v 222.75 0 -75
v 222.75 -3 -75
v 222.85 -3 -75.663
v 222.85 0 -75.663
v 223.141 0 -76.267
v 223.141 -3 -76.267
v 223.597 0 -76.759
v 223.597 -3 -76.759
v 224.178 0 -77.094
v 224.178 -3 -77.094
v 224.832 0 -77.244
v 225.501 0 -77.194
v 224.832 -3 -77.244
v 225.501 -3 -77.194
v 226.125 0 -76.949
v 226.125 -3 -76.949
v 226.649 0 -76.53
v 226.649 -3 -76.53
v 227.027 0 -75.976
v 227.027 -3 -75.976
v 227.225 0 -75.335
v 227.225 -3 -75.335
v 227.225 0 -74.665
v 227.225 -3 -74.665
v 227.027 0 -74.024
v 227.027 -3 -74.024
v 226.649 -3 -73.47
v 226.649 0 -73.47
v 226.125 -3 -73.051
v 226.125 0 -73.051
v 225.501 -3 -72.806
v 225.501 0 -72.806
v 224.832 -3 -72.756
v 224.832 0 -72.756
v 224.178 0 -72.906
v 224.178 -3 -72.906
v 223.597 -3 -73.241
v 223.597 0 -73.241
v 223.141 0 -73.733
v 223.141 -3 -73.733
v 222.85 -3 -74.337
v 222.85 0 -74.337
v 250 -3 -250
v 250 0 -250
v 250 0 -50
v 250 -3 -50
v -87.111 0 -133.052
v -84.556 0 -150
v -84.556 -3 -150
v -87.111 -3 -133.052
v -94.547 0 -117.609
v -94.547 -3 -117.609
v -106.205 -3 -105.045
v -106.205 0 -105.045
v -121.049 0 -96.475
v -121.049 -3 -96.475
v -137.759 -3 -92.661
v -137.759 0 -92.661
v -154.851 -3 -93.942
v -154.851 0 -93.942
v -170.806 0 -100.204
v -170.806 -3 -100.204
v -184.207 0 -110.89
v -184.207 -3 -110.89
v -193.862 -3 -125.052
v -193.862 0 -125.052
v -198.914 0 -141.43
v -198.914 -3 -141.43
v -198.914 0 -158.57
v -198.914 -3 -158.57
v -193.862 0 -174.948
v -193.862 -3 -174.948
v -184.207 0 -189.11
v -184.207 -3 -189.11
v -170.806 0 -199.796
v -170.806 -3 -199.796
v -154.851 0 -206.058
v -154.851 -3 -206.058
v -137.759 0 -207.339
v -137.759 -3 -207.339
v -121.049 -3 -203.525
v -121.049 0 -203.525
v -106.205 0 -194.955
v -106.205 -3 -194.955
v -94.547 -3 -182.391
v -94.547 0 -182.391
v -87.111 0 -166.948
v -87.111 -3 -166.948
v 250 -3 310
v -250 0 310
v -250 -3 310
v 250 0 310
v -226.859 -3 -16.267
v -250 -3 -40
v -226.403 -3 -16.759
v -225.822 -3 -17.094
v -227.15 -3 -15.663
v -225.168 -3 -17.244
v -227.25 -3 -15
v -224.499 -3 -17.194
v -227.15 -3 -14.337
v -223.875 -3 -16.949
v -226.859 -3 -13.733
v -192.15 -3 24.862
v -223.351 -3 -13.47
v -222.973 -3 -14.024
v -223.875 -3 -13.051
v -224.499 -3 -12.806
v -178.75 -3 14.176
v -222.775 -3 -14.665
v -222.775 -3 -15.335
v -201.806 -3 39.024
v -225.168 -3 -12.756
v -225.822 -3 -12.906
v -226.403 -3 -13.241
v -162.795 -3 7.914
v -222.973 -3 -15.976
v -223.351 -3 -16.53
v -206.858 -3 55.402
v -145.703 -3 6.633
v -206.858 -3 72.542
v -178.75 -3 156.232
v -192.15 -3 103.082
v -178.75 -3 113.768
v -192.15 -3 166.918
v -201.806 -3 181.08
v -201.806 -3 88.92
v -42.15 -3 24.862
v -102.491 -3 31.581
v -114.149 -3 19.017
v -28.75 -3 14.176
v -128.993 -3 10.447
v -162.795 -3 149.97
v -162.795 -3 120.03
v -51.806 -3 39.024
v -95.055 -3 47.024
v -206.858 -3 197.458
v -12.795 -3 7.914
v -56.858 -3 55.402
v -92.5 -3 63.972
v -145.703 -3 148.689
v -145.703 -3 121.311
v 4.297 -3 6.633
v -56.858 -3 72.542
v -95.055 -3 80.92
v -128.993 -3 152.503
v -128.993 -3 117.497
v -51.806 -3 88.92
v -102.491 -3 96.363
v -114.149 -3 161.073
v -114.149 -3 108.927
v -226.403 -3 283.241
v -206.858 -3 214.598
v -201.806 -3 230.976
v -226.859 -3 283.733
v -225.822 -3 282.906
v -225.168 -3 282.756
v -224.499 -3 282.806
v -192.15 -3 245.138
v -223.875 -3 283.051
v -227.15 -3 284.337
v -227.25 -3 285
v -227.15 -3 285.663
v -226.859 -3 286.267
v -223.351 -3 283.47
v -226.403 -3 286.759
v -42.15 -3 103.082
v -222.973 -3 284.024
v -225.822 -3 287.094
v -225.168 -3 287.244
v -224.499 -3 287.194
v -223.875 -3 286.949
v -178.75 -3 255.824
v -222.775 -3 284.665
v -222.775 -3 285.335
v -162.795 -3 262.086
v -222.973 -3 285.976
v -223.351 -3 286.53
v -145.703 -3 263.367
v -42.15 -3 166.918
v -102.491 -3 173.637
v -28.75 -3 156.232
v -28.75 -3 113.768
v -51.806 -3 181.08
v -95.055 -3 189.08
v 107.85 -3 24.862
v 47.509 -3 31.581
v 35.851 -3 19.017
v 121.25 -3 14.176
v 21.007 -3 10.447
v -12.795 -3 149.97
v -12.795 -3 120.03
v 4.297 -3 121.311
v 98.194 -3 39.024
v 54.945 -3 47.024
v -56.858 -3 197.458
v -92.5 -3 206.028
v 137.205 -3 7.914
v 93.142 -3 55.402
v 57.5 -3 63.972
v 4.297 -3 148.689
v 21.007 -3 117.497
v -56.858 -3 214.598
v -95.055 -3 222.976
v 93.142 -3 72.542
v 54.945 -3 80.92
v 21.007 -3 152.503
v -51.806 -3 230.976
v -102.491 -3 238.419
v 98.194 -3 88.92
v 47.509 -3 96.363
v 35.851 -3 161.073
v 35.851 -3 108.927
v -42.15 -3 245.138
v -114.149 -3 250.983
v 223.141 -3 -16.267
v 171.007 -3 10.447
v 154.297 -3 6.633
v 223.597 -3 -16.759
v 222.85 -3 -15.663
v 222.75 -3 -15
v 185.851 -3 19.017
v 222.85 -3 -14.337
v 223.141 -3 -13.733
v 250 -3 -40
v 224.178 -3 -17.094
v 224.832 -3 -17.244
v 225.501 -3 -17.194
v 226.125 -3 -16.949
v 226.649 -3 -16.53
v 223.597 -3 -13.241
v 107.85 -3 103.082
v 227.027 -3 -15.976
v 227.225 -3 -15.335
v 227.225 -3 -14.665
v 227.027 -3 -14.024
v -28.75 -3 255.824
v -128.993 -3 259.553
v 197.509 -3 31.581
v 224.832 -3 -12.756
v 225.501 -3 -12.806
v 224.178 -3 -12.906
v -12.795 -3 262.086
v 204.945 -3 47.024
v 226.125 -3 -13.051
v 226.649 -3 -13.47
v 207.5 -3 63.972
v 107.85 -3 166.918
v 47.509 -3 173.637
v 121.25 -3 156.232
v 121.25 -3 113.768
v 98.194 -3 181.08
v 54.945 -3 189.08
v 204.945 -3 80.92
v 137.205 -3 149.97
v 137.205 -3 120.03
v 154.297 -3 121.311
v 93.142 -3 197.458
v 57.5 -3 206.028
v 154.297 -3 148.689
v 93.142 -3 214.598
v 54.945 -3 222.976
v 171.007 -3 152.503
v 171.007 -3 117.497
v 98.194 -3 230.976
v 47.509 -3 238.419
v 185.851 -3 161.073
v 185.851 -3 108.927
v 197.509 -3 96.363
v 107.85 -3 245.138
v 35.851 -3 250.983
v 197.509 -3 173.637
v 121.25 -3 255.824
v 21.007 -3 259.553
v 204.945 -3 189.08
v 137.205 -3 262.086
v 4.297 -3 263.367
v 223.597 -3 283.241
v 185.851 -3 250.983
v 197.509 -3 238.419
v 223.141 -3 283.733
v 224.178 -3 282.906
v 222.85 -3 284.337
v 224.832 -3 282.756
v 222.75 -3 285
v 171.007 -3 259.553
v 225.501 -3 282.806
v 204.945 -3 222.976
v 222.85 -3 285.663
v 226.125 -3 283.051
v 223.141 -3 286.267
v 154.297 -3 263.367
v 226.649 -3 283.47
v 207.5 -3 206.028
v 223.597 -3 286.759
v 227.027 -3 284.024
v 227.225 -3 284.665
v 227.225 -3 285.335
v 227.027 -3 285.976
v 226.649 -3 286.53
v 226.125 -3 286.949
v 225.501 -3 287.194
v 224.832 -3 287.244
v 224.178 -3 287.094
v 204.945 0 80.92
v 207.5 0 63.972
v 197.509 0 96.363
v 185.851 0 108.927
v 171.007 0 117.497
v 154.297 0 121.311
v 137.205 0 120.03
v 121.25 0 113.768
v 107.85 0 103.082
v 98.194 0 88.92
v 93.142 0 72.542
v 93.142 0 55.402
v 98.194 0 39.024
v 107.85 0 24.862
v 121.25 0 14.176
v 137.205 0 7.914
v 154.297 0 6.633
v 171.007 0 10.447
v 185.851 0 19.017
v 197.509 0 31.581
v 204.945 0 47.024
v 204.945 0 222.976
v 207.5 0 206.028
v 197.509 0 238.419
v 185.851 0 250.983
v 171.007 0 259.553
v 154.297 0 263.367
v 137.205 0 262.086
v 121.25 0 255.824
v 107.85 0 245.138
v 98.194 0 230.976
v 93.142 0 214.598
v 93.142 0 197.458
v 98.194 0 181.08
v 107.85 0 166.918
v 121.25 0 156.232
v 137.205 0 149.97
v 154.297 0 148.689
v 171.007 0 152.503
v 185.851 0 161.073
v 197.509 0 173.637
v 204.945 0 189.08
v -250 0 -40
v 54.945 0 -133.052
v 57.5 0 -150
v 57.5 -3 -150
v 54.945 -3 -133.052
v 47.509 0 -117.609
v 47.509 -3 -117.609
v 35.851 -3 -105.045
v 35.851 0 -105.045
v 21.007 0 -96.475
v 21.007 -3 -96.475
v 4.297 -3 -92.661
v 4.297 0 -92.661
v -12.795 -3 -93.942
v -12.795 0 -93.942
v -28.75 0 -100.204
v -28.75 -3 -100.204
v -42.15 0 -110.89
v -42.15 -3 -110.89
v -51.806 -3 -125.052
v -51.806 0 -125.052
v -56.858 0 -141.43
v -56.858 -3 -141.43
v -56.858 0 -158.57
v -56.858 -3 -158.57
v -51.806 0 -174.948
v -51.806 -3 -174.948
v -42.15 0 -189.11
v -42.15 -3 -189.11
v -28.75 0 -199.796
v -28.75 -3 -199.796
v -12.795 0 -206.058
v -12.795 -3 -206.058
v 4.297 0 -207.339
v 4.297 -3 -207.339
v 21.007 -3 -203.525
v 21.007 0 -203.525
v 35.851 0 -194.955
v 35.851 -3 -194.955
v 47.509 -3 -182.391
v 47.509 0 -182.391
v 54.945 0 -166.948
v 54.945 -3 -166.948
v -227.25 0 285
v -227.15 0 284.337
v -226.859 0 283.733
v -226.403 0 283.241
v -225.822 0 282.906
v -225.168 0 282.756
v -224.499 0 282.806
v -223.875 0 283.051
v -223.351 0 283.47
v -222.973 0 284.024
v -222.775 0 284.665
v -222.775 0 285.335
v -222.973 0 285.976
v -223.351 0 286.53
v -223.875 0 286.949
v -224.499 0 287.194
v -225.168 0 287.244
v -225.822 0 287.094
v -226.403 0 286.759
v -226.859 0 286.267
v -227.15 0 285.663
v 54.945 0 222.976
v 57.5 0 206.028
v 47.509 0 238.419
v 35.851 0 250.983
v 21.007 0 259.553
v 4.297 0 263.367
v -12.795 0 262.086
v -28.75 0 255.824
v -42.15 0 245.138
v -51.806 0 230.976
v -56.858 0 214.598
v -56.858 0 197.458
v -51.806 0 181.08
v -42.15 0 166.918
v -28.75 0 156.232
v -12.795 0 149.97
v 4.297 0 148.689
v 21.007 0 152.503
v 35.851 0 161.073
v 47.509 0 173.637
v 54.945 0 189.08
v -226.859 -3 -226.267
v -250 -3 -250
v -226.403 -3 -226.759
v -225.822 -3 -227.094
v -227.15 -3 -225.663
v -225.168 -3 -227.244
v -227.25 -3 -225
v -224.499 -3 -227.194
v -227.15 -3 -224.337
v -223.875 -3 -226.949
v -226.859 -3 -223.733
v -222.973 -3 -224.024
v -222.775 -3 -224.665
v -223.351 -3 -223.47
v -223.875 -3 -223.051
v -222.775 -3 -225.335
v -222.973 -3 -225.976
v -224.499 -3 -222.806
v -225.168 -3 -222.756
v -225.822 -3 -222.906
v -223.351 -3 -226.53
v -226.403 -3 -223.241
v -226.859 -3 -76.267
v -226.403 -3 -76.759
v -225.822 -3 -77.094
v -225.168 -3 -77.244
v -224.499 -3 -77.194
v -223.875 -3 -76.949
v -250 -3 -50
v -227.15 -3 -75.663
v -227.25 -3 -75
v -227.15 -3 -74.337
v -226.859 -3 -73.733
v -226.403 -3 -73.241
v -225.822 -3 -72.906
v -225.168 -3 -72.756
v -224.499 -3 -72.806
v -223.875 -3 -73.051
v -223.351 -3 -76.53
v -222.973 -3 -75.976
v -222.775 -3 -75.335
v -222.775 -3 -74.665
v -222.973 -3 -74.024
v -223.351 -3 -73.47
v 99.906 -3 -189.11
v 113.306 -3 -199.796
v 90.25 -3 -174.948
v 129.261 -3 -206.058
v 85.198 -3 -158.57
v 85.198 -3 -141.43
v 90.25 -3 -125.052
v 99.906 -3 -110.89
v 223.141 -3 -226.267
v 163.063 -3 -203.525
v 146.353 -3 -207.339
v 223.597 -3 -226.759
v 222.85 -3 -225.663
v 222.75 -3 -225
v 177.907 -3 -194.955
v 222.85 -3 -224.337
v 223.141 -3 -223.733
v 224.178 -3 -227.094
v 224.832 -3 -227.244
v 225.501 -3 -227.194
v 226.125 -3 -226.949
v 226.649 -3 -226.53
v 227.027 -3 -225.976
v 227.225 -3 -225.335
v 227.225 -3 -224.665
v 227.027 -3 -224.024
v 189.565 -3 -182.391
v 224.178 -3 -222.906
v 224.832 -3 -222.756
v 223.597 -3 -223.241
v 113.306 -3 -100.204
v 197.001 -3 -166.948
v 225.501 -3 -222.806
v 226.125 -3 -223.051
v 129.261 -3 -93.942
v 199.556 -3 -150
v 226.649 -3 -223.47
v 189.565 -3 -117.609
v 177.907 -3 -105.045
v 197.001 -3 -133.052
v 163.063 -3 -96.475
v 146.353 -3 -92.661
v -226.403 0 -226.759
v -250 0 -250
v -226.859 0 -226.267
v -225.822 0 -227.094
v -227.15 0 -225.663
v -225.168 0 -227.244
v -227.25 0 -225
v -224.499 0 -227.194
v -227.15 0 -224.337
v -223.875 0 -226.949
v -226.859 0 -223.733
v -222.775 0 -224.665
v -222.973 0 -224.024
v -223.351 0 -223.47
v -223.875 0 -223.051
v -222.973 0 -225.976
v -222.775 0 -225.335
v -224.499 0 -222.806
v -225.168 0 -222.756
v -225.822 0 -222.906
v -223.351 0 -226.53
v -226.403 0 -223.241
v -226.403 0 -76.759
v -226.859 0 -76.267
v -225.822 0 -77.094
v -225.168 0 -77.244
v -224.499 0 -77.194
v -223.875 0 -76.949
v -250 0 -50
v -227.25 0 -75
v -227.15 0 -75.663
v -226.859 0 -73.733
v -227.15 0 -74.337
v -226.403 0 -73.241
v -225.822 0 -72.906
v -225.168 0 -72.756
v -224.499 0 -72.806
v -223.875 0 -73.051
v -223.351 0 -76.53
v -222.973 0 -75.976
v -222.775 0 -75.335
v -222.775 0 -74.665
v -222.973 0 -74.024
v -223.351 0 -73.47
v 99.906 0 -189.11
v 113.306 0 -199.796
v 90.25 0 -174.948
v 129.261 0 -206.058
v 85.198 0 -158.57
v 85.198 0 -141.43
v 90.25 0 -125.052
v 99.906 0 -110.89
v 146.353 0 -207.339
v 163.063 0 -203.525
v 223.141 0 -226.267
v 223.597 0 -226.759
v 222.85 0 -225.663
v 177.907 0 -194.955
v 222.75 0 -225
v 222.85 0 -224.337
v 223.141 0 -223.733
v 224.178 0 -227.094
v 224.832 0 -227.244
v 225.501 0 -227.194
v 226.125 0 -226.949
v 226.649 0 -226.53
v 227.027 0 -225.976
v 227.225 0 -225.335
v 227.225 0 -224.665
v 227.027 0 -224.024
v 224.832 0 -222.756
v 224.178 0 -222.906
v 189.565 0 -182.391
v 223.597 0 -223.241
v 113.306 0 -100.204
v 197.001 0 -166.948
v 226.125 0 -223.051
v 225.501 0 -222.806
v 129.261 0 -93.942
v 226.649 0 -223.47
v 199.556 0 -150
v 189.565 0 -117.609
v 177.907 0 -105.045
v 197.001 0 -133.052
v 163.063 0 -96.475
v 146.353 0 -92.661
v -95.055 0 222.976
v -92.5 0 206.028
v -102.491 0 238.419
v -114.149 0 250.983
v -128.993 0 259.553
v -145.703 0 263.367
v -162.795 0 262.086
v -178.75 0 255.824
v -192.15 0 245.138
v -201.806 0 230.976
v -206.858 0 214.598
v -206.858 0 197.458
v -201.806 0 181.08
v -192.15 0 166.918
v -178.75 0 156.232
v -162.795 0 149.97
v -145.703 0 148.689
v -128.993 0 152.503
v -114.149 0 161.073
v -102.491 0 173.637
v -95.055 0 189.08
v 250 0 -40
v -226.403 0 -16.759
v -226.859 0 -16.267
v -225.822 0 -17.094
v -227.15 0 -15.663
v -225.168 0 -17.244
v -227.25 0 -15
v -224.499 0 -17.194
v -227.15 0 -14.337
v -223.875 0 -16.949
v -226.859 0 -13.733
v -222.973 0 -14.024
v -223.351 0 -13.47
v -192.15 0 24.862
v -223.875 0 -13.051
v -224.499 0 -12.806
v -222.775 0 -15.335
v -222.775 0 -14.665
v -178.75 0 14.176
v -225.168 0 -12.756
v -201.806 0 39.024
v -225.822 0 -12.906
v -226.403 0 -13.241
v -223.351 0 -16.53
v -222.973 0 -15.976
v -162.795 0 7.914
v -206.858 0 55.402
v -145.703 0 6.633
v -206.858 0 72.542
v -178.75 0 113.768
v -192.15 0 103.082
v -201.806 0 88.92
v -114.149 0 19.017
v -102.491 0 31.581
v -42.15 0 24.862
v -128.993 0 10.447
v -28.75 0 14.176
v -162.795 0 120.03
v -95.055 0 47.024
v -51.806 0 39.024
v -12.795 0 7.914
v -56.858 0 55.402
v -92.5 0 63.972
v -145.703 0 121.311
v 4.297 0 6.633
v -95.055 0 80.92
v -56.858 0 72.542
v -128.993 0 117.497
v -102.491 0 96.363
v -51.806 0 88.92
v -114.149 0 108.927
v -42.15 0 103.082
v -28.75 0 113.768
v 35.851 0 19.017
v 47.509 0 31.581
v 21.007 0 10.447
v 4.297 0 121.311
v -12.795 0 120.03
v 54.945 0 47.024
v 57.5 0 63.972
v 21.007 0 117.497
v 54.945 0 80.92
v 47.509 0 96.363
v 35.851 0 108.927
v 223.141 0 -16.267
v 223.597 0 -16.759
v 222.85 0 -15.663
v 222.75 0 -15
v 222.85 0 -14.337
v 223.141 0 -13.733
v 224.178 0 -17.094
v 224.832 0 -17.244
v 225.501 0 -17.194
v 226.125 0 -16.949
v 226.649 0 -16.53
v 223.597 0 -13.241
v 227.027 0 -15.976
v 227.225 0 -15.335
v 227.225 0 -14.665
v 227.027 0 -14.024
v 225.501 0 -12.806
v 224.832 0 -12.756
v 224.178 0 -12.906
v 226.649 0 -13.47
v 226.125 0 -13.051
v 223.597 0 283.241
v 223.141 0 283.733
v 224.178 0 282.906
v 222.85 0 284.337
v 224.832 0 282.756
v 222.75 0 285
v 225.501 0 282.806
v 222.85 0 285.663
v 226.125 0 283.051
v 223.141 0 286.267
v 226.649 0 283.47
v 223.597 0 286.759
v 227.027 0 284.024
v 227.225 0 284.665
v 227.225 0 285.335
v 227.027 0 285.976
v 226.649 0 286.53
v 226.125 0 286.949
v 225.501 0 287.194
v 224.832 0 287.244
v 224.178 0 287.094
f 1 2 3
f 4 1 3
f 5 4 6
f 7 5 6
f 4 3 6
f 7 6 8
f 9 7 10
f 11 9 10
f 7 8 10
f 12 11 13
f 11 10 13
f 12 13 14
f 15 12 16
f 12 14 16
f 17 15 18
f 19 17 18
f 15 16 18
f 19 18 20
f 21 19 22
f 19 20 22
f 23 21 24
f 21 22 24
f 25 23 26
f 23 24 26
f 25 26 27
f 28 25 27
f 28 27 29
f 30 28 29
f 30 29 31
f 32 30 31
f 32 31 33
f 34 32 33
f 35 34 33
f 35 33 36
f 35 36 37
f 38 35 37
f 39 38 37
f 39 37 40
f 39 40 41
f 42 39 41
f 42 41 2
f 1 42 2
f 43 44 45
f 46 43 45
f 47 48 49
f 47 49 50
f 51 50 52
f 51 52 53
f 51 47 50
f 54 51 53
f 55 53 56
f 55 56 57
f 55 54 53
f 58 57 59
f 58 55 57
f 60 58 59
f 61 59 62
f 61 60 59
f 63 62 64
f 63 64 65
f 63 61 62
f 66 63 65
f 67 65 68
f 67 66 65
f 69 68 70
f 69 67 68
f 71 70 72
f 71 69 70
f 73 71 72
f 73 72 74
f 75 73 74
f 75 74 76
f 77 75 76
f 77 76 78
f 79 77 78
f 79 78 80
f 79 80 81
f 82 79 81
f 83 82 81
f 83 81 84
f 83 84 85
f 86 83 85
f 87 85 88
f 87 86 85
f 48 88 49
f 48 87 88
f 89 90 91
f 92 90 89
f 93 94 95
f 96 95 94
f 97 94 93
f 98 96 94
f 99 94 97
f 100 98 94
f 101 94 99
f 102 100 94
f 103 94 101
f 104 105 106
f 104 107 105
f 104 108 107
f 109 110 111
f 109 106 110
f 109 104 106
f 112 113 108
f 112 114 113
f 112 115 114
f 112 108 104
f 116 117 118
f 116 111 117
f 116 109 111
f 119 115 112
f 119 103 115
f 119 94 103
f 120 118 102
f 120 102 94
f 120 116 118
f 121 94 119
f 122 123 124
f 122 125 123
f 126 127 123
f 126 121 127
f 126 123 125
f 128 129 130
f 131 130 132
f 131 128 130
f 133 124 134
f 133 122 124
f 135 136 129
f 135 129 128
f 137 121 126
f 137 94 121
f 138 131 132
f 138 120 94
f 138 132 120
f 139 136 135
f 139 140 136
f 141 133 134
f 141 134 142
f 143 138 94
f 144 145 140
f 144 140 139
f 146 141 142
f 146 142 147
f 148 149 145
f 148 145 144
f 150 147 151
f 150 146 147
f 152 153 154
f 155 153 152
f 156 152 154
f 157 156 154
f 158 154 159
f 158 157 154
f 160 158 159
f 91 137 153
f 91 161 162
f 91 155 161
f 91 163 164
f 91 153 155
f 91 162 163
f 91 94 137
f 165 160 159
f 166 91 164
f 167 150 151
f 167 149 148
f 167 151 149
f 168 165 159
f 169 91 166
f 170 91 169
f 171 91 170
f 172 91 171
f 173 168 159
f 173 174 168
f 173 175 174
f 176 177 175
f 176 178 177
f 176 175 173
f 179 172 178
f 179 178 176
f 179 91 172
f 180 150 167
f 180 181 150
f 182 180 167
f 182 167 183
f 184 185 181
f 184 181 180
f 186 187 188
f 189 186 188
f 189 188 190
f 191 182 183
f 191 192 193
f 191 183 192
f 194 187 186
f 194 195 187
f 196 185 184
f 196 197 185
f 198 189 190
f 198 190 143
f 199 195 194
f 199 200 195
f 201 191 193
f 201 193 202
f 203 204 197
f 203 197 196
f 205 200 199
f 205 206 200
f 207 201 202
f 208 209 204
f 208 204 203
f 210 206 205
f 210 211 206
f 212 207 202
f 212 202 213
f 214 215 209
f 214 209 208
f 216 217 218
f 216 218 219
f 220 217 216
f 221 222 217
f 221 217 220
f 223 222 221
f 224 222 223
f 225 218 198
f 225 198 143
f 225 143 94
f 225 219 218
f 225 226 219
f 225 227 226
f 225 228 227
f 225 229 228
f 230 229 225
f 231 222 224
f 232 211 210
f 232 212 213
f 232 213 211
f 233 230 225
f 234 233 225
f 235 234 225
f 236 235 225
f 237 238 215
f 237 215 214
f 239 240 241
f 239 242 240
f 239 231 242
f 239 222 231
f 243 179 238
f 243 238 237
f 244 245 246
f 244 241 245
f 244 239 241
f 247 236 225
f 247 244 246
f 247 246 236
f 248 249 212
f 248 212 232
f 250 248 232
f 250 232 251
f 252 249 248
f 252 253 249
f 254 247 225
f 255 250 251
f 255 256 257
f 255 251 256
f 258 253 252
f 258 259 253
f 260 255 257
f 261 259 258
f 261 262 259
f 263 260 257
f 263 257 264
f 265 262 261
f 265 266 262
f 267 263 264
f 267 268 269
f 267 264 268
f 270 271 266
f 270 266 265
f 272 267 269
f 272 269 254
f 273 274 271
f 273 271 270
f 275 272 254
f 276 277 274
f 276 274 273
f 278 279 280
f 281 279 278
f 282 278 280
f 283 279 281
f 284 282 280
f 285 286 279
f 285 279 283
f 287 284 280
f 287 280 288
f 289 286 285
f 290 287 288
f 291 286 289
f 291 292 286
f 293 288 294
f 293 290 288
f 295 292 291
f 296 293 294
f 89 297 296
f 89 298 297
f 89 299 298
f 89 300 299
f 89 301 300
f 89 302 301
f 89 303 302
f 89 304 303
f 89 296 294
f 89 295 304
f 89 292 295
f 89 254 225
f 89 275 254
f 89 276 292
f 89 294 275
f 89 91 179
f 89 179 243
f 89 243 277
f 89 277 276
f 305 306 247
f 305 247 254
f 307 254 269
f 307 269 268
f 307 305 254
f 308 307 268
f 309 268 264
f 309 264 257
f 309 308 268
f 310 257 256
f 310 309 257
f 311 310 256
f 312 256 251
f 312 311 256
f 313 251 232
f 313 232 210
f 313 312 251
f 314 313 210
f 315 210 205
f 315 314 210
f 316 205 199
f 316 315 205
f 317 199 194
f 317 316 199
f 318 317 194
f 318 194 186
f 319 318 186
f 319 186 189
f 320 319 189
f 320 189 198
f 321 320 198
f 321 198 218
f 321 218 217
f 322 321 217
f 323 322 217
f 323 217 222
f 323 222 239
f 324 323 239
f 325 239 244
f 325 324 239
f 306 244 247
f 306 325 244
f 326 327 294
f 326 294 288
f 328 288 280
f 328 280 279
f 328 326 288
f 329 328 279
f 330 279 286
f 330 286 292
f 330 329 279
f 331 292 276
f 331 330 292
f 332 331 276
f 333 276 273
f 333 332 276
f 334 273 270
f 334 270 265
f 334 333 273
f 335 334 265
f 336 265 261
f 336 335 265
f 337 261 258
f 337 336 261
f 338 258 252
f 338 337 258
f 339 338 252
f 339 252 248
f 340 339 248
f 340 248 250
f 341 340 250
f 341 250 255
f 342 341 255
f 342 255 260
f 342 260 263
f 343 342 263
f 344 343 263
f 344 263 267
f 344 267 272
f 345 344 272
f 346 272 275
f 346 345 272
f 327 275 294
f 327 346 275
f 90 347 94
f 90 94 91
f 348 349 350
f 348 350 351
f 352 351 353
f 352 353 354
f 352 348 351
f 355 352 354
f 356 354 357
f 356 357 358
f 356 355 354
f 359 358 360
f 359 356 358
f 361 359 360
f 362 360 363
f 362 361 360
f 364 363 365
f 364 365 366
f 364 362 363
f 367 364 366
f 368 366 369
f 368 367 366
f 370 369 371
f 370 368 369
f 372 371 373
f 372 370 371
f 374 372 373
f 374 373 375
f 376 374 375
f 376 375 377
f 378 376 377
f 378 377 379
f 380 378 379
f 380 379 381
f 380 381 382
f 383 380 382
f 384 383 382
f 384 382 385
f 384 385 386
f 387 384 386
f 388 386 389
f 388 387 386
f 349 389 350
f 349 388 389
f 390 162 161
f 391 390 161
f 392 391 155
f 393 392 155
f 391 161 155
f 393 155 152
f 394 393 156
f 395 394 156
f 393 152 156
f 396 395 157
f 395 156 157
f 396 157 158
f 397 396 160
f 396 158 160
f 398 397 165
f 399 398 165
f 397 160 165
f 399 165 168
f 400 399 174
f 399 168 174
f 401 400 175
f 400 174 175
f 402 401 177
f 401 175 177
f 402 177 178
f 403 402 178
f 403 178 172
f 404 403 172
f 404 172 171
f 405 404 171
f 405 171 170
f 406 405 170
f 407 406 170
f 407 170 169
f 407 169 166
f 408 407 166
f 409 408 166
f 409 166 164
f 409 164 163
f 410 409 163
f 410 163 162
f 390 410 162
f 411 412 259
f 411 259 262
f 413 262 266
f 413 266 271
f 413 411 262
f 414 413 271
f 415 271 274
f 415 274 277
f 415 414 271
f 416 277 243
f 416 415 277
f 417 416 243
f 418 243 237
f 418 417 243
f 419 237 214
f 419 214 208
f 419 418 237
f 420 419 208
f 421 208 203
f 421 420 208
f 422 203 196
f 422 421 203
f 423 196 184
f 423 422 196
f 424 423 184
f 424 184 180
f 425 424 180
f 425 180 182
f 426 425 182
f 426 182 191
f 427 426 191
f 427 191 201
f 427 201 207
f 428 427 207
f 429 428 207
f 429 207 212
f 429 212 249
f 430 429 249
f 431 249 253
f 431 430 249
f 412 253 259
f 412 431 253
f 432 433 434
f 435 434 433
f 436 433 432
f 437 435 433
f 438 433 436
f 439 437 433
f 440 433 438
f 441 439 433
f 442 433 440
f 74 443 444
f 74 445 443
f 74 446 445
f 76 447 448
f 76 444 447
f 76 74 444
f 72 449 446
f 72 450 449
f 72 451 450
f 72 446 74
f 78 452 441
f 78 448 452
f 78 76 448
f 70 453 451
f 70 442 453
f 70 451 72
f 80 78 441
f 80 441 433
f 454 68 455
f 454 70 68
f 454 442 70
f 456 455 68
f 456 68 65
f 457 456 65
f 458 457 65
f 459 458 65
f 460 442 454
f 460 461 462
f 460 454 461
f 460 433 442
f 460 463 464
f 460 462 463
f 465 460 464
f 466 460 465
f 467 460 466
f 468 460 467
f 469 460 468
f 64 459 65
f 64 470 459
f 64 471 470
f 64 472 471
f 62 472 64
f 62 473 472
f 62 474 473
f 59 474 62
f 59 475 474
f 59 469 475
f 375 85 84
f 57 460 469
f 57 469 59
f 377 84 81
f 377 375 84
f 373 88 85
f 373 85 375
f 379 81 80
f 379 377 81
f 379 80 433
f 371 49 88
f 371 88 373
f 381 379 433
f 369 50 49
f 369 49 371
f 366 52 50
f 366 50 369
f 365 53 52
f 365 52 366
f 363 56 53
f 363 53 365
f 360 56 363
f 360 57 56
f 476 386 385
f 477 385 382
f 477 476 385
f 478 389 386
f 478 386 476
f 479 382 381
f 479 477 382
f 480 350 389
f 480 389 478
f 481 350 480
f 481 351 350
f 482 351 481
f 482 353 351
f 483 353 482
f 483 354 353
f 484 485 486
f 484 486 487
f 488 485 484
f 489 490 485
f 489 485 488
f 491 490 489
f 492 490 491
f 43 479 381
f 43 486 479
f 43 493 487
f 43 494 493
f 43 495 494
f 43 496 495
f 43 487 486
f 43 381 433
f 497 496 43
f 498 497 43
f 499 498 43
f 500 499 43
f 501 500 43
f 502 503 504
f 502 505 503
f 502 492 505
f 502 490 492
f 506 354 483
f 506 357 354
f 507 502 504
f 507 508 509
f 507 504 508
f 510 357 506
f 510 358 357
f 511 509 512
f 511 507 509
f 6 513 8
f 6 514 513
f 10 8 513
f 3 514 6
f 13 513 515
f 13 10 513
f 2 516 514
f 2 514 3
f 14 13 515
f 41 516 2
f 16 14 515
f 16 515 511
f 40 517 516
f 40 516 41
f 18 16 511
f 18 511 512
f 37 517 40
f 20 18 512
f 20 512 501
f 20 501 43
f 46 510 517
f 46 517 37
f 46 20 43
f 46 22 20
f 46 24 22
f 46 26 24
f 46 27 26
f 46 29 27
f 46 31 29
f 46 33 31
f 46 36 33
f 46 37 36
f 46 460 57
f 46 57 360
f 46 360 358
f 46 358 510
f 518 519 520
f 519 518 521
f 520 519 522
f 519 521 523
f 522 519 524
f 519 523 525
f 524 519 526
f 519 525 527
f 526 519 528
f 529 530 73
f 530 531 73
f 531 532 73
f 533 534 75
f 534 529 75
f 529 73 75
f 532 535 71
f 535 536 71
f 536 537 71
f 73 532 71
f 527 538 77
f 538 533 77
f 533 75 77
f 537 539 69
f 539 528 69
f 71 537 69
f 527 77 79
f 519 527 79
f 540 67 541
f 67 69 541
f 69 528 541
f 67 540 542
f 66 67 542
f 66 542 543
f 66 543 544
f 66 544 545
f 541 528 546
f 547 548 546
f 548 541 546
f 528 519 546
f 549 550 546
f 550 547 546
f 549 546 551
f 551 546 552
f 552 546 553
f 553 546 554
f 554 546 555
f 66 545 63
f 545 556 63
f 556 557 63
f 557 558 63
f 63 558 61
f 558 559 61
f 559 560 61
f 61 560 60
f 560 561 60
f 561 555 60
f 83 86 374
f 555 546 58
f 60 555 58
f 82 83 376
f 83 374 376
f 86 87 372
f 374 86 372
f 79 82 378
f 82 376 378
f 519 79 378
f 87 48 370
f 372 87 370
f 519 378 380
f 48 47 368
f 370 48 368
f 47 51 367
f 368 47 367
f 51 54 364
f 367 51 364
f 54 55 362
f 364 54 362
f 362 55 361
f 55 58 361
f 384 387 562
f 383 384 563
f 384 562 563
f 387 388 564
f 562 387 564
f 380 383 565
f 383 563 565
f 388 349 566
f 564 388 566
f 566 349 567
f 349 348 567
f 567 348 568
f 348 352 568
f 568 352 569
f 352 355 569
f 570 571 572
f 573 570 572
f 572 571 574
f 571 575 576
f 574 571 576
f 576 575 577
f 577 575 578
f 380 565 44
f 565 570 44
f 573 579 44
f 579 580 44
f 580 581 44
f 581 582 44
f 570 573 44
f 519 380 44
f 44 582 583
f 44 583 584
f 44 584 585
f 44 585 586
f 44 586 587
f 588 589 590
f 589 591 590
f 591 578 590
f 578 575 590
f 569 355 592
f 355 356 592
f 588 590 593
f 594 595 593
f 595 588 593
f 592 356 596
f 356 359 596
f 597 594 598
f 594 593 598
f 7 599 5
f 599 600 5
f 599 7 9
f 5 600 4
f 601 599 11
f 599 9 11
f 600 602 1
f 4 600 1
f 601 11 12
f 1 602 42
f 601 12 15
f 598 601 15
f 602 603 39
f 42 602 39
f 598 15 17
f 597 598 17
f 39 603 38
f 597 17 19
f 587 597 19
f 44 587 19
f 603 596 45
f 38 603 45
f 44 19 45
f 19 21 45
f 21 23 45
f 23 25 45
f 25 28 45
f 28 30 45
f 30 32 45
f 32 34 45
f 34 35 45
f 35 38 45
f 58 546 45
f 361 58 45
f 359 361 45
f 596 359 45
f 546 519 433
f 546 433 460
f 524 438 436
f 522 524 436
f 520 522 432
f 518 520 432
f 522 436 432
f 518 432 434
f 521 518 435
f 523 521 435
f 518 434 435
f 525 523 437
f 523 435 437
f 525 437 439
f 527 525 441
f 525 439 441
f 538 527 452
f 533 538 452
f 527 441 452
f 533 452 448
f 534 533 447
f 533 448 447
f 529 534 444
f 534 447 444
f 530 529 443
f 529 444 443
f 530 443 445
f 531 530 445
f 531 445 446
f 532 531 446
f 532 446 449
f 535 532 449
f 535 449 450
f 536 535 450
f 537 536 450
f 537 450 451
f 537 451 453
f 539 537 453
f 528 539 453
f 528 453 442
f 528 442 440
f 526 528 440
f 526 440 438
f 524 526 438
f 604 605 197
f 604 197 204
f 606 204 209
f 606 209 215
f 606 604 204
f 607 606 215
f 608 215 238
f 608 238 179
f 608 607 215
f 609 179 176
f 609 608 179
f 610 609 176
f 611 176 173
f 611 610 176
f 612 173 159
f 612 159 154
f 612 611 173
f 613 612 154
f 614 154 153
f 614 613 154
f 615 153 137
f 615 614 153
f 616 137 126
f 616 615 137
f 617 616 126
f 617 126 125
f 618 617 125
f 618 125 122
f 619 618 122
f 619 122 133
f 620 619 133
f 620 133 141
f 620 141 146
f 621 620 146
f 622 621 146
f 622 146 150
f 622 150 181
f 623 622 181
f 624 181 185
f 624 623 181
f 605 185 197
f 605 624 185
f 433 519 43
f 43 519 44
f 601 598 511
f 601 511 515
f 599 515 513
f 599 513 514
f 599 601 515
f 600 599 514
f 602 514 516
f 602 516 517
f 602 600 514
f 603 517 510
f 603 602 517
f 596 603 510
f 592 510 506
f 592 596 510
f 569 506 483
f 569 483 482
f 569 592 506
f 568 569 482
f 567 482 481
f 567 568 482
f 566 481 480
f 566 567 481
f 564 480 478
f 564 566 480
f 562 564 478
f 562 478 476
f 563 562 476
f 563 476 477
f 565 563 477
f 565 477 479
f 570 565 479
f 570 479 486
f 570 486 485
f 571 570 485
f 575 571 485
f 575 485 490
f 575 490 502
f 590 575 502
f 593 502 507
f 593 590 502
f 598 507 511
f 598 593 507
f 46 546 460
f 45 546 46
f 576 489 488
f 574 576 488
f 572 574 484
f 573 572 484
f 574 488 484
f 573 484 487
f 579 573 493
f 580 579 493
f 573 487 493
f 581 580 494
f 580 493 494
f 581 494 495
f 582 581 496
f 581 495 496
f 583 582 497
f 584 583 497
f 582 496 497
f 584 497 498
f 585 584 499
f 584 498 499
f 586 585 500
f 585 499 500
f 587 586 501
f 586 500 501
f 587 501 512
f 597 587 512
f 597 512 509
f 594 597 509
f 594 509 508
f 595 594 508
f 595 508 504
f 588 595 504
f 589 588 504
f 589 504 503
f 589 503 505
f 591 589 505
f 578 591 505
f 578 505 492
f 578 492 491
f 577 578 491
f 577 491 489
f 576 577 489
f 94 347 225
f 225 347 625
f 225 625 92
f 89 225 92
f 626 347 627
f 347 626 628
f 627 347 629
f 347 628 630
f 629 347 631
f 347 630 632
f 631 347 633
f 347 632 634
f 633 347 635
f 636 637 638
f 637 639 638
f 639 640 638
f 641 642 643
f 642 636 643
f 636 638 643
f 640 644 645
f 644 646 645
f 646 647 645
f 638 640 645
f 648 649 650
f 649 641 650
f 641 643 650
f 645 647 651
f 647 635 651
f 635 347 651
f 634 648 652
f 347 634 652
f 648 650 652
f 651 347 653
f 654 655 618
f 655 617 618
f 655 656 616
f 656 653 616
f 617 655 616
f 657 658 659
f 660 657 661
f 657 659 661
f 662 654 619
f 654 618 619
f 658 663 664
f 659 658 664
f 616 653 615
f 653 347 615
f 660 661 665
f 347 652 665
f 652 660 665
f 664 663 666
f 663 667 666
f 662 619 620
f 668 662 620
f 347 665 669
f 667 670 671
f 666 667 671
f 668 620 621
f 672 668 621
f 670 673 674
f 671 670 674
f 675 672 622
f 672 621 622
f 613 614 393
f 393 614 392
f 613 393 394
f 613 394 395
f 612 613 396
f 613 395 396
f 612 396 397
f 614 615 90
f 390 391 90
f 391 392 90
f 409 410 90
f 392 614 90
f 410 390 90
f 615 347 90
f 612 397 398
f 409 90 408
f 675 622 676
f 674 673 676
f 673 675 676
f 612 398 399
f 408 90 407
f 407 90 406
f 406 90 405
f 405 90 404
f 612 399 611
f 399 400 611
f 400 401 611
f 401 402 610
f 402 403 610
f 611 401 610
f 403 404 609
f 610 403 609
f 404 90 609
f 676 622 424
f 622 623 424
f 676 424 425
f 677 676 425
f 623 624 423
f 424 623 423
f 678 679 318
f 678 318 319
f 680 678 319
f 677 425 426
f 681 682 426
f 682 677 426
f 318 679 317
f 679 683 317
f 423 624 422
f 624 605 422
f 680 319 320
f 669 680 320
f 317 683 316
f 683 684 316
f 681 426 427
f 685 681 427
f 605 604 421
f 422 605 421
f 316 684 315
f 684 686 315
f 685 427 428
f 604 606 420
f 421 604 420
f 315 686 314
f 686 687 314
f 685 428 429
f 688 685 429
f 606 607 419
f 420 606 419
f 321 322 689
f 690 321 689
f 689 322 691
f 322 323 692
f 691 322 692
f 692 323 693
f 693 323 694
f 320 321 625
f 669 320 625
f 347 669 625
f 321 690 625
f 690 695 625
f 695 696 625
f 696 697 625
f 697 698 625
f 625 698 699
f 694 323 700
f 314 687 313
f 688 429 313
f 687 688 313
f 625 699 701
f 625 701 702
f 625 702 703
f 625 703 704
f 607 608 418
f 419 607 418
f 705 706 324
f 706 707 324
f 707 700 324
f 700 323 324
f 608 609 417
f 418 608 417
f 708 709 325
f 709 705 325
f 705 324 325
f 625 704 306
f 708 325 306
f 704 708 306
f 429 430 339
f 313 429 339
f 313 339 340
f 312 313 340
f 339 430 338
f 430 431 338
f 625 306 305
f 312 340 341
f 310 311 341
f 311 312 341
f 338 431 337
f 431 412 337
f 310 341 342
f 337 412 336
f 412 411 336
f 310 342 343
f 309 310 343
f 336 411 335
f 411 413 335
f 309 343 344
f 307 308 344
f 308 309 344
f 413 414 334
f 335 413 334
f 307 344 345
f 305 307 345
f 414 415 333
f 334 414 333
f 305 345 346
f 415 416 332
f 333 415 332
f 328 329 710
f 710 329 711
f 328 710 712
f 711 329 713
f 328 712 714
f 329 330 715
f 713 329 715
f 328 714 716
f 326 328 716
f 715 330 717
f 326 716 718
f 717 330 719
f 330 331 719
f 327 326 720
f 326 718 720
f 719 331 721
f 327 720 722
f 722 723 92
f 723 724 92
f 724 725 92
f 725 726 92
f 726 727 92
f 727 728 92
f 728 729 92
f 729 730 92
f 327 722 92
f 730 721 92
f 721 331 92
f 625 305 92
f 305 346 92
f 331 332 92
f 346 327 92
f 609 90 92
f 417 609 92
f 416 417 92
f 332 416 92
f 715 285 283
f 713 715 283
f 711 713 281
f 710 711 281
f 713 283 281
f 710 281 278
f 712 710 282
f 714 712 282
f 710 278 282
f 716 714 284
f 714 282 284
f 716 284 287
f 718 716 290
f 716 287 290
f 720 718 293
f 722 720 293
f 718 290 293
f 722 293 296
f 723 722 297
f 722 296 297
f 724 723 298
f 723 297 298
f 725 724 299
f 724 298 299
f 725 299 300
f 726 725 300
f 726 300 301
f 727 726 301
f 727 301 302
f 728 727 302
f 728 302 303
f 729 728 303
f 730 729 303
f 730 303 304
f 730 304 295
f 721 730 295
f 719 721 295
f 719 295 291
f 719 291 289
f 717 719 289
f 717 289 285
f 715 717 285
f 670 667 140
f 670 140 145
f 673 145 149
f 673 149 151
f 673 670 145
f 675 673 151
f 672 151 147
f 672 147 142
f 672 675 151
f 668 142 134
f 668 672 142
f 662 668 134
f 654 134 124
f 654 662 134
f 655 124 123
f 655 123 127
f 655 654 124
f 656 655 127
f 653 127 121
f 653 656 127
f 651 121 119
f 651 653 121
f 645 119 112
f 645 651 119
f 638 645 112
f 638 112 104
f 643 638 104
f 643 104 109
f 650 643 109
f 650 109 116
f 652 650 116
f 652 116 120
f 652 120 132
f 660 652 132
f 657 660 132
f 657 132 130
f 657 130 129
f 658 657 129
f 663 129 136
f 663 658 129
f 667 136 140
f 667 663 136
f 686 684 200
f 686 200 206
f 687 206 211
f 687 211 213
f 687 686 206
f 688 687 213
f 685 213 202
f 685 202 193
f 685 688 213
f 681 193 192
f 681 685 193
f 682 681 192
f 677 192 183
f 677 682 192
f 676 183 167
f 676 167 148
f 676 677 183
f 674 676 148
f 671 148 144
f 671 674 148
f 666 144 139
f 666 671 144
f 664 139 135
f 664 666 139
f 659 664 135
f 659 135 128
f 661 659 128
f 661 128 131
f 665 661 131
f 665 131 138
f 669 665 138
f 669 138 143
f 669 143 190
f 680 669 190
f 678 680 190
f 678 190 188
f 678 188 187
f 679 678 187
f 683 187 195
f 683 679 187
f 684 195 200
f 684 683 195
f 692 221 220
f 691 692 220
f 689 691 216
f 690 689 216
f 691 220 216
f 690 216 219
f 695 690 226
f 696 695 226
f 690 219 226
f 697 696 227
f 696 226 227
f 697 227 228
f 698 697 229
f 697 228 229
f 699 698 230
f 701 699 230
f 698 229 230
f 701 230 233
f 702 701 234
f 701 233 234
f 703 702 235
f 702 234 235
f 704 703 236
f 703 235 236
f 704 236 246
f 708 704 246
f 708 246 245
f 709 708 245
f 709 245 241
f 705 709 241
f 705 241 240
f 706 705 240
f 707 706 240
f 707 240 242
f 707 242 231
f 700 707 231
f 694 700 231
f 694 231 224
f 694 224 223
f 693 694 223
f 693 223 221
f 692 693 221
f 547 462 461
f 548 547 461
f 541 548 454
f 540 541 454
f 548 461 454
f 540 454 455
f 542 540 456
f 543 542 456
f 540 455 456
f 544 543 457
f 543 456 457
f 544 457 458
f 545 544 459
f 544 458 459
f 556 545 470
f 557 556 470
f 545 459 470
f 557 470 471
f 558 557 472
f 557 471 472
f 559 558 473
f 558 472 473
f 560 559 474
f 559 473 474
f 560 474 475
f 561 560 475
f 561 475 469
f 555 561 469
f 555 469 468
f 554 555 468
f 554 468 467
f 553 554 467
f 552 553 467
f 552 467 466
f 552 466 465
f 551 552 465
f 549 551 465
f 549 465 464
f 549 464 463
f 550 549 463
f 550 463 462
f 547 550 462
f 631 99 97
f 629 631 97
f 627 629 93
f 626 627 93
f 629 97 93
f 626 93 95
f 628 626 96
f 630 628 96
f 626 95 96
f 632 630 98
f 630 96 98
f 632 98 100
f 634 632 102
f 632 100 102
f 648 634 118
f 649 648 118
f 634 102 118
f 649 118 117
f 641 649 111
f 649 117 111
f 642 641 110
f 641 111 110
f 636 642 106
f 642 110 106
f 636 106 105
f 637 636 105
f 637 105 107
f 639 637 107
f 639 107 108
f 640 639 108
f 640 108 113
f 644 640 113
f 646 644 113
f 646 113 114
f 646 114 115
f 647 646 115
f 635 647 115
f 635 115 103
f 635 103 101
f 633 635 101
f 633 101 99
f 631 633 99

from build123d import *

# Parameters (mm, degrees)
F0_W       = 500
F0_H       = 200
F0_R       = 57.5
F1_DEPTH   = 3
F0_H_2     = 350
F2_D       = 4.5
F2_DEPTH   = 16.5
F2_TIP     = 1.3519363928
F2_2_D     = 4.5
F2_2_DEPTH = 16.5
F2_2_TIP   = 1.3519363928


with BuildPart() as f1:
    # F0 (on Front) → F1 (new body)
    with BuildSketch(Plane.XZ):
        with Locations((0, -150)):
            Rectangle(F0_W, F0_H)
        with Locations((-142.0560575161, -150)):
            Circle(F0_R, mode=Mode.SUBTRACT)
        with Locations((0, -150)):
            Circle(F0_R, mode=Mode.SUBTRACT)
        with Locations((142.0560575161, -150)):
            Circle(F0_R, mode=Mode.SUBTRACT)
    extrude(amount=F1_DEPTH)

    # F2
    with Locations(Plane(origin=(0, 0, 0), x_dir=(1, 0, 0), z_dir=(0, 1, 0))):
        with Locations((225, -285), (225, 15), (-225, 15), (-225, -285), (-225, 225), (-225, 75), (225, 75), (225, 225)):
            Hole(F2_D / 2, depth=F2_DEPTH)
            with Locations((0, 0, -(F2_DEPTH + F2_TIP / 2))):  # 118° drill point
                Cone(0, F2_D / 2, F2_TIP, mode=Mode.SUBTRACT)


with BuildPart() as f1b:
    # F0 (on Front) → F1, piece 2 (new body)
    with BuildSketch(Plane.XZ):
        with Locations((0, 135)):
            Rectangle(F0_W, F0_H_2)
        with Locations((-150, 63.971966333)):
            Circle(F0_R, mode=Mode.SUBTRACT)
        with Locations((-150, 206.028033667)):
            Circle(F0_R, mode=Mode.SUBTRACT)
        with Locations((0, 63.971966333)):
            Circle(F0_R, mode=Mode.SUBTRACT)
        with Locations((150, 63.971966333)):
            Circle(F0_R, mode=Mode.SUBTRACT)
        with Locations((0, 206.028033667)):
            Circle(F0_R, mode=Mode.SUBTRACT)
        with Locations((150, 206.028033667)):
            Circle(F0_R, mode=Mode.SUBTRACT)
    extrude(amount=F1_DEPTH)

    # F2#2
    with Locations(Plane(origin=(0, 0, 0), x_dir=(1, 0, 0), z_dir=(0, 1, 0))):
        with Locations((225, -285), (225, 15), (-225, 15), (-225, -285), (-225, 225), (-225, 75), (225, 75), (225, 225)):
            Hole(F2_2_D / 2, depth=F2_2_DEPTH)
            with Locations((0, 0, -(F2_2_DEPTH + F2_2_TIP / 2))):  # 118° drill point
                Cone(0, F2_2_D / 2, F2_2_TIP, mode=Mode.SUBTRACT)


solid = Compound([f1.part, f1b.part])
